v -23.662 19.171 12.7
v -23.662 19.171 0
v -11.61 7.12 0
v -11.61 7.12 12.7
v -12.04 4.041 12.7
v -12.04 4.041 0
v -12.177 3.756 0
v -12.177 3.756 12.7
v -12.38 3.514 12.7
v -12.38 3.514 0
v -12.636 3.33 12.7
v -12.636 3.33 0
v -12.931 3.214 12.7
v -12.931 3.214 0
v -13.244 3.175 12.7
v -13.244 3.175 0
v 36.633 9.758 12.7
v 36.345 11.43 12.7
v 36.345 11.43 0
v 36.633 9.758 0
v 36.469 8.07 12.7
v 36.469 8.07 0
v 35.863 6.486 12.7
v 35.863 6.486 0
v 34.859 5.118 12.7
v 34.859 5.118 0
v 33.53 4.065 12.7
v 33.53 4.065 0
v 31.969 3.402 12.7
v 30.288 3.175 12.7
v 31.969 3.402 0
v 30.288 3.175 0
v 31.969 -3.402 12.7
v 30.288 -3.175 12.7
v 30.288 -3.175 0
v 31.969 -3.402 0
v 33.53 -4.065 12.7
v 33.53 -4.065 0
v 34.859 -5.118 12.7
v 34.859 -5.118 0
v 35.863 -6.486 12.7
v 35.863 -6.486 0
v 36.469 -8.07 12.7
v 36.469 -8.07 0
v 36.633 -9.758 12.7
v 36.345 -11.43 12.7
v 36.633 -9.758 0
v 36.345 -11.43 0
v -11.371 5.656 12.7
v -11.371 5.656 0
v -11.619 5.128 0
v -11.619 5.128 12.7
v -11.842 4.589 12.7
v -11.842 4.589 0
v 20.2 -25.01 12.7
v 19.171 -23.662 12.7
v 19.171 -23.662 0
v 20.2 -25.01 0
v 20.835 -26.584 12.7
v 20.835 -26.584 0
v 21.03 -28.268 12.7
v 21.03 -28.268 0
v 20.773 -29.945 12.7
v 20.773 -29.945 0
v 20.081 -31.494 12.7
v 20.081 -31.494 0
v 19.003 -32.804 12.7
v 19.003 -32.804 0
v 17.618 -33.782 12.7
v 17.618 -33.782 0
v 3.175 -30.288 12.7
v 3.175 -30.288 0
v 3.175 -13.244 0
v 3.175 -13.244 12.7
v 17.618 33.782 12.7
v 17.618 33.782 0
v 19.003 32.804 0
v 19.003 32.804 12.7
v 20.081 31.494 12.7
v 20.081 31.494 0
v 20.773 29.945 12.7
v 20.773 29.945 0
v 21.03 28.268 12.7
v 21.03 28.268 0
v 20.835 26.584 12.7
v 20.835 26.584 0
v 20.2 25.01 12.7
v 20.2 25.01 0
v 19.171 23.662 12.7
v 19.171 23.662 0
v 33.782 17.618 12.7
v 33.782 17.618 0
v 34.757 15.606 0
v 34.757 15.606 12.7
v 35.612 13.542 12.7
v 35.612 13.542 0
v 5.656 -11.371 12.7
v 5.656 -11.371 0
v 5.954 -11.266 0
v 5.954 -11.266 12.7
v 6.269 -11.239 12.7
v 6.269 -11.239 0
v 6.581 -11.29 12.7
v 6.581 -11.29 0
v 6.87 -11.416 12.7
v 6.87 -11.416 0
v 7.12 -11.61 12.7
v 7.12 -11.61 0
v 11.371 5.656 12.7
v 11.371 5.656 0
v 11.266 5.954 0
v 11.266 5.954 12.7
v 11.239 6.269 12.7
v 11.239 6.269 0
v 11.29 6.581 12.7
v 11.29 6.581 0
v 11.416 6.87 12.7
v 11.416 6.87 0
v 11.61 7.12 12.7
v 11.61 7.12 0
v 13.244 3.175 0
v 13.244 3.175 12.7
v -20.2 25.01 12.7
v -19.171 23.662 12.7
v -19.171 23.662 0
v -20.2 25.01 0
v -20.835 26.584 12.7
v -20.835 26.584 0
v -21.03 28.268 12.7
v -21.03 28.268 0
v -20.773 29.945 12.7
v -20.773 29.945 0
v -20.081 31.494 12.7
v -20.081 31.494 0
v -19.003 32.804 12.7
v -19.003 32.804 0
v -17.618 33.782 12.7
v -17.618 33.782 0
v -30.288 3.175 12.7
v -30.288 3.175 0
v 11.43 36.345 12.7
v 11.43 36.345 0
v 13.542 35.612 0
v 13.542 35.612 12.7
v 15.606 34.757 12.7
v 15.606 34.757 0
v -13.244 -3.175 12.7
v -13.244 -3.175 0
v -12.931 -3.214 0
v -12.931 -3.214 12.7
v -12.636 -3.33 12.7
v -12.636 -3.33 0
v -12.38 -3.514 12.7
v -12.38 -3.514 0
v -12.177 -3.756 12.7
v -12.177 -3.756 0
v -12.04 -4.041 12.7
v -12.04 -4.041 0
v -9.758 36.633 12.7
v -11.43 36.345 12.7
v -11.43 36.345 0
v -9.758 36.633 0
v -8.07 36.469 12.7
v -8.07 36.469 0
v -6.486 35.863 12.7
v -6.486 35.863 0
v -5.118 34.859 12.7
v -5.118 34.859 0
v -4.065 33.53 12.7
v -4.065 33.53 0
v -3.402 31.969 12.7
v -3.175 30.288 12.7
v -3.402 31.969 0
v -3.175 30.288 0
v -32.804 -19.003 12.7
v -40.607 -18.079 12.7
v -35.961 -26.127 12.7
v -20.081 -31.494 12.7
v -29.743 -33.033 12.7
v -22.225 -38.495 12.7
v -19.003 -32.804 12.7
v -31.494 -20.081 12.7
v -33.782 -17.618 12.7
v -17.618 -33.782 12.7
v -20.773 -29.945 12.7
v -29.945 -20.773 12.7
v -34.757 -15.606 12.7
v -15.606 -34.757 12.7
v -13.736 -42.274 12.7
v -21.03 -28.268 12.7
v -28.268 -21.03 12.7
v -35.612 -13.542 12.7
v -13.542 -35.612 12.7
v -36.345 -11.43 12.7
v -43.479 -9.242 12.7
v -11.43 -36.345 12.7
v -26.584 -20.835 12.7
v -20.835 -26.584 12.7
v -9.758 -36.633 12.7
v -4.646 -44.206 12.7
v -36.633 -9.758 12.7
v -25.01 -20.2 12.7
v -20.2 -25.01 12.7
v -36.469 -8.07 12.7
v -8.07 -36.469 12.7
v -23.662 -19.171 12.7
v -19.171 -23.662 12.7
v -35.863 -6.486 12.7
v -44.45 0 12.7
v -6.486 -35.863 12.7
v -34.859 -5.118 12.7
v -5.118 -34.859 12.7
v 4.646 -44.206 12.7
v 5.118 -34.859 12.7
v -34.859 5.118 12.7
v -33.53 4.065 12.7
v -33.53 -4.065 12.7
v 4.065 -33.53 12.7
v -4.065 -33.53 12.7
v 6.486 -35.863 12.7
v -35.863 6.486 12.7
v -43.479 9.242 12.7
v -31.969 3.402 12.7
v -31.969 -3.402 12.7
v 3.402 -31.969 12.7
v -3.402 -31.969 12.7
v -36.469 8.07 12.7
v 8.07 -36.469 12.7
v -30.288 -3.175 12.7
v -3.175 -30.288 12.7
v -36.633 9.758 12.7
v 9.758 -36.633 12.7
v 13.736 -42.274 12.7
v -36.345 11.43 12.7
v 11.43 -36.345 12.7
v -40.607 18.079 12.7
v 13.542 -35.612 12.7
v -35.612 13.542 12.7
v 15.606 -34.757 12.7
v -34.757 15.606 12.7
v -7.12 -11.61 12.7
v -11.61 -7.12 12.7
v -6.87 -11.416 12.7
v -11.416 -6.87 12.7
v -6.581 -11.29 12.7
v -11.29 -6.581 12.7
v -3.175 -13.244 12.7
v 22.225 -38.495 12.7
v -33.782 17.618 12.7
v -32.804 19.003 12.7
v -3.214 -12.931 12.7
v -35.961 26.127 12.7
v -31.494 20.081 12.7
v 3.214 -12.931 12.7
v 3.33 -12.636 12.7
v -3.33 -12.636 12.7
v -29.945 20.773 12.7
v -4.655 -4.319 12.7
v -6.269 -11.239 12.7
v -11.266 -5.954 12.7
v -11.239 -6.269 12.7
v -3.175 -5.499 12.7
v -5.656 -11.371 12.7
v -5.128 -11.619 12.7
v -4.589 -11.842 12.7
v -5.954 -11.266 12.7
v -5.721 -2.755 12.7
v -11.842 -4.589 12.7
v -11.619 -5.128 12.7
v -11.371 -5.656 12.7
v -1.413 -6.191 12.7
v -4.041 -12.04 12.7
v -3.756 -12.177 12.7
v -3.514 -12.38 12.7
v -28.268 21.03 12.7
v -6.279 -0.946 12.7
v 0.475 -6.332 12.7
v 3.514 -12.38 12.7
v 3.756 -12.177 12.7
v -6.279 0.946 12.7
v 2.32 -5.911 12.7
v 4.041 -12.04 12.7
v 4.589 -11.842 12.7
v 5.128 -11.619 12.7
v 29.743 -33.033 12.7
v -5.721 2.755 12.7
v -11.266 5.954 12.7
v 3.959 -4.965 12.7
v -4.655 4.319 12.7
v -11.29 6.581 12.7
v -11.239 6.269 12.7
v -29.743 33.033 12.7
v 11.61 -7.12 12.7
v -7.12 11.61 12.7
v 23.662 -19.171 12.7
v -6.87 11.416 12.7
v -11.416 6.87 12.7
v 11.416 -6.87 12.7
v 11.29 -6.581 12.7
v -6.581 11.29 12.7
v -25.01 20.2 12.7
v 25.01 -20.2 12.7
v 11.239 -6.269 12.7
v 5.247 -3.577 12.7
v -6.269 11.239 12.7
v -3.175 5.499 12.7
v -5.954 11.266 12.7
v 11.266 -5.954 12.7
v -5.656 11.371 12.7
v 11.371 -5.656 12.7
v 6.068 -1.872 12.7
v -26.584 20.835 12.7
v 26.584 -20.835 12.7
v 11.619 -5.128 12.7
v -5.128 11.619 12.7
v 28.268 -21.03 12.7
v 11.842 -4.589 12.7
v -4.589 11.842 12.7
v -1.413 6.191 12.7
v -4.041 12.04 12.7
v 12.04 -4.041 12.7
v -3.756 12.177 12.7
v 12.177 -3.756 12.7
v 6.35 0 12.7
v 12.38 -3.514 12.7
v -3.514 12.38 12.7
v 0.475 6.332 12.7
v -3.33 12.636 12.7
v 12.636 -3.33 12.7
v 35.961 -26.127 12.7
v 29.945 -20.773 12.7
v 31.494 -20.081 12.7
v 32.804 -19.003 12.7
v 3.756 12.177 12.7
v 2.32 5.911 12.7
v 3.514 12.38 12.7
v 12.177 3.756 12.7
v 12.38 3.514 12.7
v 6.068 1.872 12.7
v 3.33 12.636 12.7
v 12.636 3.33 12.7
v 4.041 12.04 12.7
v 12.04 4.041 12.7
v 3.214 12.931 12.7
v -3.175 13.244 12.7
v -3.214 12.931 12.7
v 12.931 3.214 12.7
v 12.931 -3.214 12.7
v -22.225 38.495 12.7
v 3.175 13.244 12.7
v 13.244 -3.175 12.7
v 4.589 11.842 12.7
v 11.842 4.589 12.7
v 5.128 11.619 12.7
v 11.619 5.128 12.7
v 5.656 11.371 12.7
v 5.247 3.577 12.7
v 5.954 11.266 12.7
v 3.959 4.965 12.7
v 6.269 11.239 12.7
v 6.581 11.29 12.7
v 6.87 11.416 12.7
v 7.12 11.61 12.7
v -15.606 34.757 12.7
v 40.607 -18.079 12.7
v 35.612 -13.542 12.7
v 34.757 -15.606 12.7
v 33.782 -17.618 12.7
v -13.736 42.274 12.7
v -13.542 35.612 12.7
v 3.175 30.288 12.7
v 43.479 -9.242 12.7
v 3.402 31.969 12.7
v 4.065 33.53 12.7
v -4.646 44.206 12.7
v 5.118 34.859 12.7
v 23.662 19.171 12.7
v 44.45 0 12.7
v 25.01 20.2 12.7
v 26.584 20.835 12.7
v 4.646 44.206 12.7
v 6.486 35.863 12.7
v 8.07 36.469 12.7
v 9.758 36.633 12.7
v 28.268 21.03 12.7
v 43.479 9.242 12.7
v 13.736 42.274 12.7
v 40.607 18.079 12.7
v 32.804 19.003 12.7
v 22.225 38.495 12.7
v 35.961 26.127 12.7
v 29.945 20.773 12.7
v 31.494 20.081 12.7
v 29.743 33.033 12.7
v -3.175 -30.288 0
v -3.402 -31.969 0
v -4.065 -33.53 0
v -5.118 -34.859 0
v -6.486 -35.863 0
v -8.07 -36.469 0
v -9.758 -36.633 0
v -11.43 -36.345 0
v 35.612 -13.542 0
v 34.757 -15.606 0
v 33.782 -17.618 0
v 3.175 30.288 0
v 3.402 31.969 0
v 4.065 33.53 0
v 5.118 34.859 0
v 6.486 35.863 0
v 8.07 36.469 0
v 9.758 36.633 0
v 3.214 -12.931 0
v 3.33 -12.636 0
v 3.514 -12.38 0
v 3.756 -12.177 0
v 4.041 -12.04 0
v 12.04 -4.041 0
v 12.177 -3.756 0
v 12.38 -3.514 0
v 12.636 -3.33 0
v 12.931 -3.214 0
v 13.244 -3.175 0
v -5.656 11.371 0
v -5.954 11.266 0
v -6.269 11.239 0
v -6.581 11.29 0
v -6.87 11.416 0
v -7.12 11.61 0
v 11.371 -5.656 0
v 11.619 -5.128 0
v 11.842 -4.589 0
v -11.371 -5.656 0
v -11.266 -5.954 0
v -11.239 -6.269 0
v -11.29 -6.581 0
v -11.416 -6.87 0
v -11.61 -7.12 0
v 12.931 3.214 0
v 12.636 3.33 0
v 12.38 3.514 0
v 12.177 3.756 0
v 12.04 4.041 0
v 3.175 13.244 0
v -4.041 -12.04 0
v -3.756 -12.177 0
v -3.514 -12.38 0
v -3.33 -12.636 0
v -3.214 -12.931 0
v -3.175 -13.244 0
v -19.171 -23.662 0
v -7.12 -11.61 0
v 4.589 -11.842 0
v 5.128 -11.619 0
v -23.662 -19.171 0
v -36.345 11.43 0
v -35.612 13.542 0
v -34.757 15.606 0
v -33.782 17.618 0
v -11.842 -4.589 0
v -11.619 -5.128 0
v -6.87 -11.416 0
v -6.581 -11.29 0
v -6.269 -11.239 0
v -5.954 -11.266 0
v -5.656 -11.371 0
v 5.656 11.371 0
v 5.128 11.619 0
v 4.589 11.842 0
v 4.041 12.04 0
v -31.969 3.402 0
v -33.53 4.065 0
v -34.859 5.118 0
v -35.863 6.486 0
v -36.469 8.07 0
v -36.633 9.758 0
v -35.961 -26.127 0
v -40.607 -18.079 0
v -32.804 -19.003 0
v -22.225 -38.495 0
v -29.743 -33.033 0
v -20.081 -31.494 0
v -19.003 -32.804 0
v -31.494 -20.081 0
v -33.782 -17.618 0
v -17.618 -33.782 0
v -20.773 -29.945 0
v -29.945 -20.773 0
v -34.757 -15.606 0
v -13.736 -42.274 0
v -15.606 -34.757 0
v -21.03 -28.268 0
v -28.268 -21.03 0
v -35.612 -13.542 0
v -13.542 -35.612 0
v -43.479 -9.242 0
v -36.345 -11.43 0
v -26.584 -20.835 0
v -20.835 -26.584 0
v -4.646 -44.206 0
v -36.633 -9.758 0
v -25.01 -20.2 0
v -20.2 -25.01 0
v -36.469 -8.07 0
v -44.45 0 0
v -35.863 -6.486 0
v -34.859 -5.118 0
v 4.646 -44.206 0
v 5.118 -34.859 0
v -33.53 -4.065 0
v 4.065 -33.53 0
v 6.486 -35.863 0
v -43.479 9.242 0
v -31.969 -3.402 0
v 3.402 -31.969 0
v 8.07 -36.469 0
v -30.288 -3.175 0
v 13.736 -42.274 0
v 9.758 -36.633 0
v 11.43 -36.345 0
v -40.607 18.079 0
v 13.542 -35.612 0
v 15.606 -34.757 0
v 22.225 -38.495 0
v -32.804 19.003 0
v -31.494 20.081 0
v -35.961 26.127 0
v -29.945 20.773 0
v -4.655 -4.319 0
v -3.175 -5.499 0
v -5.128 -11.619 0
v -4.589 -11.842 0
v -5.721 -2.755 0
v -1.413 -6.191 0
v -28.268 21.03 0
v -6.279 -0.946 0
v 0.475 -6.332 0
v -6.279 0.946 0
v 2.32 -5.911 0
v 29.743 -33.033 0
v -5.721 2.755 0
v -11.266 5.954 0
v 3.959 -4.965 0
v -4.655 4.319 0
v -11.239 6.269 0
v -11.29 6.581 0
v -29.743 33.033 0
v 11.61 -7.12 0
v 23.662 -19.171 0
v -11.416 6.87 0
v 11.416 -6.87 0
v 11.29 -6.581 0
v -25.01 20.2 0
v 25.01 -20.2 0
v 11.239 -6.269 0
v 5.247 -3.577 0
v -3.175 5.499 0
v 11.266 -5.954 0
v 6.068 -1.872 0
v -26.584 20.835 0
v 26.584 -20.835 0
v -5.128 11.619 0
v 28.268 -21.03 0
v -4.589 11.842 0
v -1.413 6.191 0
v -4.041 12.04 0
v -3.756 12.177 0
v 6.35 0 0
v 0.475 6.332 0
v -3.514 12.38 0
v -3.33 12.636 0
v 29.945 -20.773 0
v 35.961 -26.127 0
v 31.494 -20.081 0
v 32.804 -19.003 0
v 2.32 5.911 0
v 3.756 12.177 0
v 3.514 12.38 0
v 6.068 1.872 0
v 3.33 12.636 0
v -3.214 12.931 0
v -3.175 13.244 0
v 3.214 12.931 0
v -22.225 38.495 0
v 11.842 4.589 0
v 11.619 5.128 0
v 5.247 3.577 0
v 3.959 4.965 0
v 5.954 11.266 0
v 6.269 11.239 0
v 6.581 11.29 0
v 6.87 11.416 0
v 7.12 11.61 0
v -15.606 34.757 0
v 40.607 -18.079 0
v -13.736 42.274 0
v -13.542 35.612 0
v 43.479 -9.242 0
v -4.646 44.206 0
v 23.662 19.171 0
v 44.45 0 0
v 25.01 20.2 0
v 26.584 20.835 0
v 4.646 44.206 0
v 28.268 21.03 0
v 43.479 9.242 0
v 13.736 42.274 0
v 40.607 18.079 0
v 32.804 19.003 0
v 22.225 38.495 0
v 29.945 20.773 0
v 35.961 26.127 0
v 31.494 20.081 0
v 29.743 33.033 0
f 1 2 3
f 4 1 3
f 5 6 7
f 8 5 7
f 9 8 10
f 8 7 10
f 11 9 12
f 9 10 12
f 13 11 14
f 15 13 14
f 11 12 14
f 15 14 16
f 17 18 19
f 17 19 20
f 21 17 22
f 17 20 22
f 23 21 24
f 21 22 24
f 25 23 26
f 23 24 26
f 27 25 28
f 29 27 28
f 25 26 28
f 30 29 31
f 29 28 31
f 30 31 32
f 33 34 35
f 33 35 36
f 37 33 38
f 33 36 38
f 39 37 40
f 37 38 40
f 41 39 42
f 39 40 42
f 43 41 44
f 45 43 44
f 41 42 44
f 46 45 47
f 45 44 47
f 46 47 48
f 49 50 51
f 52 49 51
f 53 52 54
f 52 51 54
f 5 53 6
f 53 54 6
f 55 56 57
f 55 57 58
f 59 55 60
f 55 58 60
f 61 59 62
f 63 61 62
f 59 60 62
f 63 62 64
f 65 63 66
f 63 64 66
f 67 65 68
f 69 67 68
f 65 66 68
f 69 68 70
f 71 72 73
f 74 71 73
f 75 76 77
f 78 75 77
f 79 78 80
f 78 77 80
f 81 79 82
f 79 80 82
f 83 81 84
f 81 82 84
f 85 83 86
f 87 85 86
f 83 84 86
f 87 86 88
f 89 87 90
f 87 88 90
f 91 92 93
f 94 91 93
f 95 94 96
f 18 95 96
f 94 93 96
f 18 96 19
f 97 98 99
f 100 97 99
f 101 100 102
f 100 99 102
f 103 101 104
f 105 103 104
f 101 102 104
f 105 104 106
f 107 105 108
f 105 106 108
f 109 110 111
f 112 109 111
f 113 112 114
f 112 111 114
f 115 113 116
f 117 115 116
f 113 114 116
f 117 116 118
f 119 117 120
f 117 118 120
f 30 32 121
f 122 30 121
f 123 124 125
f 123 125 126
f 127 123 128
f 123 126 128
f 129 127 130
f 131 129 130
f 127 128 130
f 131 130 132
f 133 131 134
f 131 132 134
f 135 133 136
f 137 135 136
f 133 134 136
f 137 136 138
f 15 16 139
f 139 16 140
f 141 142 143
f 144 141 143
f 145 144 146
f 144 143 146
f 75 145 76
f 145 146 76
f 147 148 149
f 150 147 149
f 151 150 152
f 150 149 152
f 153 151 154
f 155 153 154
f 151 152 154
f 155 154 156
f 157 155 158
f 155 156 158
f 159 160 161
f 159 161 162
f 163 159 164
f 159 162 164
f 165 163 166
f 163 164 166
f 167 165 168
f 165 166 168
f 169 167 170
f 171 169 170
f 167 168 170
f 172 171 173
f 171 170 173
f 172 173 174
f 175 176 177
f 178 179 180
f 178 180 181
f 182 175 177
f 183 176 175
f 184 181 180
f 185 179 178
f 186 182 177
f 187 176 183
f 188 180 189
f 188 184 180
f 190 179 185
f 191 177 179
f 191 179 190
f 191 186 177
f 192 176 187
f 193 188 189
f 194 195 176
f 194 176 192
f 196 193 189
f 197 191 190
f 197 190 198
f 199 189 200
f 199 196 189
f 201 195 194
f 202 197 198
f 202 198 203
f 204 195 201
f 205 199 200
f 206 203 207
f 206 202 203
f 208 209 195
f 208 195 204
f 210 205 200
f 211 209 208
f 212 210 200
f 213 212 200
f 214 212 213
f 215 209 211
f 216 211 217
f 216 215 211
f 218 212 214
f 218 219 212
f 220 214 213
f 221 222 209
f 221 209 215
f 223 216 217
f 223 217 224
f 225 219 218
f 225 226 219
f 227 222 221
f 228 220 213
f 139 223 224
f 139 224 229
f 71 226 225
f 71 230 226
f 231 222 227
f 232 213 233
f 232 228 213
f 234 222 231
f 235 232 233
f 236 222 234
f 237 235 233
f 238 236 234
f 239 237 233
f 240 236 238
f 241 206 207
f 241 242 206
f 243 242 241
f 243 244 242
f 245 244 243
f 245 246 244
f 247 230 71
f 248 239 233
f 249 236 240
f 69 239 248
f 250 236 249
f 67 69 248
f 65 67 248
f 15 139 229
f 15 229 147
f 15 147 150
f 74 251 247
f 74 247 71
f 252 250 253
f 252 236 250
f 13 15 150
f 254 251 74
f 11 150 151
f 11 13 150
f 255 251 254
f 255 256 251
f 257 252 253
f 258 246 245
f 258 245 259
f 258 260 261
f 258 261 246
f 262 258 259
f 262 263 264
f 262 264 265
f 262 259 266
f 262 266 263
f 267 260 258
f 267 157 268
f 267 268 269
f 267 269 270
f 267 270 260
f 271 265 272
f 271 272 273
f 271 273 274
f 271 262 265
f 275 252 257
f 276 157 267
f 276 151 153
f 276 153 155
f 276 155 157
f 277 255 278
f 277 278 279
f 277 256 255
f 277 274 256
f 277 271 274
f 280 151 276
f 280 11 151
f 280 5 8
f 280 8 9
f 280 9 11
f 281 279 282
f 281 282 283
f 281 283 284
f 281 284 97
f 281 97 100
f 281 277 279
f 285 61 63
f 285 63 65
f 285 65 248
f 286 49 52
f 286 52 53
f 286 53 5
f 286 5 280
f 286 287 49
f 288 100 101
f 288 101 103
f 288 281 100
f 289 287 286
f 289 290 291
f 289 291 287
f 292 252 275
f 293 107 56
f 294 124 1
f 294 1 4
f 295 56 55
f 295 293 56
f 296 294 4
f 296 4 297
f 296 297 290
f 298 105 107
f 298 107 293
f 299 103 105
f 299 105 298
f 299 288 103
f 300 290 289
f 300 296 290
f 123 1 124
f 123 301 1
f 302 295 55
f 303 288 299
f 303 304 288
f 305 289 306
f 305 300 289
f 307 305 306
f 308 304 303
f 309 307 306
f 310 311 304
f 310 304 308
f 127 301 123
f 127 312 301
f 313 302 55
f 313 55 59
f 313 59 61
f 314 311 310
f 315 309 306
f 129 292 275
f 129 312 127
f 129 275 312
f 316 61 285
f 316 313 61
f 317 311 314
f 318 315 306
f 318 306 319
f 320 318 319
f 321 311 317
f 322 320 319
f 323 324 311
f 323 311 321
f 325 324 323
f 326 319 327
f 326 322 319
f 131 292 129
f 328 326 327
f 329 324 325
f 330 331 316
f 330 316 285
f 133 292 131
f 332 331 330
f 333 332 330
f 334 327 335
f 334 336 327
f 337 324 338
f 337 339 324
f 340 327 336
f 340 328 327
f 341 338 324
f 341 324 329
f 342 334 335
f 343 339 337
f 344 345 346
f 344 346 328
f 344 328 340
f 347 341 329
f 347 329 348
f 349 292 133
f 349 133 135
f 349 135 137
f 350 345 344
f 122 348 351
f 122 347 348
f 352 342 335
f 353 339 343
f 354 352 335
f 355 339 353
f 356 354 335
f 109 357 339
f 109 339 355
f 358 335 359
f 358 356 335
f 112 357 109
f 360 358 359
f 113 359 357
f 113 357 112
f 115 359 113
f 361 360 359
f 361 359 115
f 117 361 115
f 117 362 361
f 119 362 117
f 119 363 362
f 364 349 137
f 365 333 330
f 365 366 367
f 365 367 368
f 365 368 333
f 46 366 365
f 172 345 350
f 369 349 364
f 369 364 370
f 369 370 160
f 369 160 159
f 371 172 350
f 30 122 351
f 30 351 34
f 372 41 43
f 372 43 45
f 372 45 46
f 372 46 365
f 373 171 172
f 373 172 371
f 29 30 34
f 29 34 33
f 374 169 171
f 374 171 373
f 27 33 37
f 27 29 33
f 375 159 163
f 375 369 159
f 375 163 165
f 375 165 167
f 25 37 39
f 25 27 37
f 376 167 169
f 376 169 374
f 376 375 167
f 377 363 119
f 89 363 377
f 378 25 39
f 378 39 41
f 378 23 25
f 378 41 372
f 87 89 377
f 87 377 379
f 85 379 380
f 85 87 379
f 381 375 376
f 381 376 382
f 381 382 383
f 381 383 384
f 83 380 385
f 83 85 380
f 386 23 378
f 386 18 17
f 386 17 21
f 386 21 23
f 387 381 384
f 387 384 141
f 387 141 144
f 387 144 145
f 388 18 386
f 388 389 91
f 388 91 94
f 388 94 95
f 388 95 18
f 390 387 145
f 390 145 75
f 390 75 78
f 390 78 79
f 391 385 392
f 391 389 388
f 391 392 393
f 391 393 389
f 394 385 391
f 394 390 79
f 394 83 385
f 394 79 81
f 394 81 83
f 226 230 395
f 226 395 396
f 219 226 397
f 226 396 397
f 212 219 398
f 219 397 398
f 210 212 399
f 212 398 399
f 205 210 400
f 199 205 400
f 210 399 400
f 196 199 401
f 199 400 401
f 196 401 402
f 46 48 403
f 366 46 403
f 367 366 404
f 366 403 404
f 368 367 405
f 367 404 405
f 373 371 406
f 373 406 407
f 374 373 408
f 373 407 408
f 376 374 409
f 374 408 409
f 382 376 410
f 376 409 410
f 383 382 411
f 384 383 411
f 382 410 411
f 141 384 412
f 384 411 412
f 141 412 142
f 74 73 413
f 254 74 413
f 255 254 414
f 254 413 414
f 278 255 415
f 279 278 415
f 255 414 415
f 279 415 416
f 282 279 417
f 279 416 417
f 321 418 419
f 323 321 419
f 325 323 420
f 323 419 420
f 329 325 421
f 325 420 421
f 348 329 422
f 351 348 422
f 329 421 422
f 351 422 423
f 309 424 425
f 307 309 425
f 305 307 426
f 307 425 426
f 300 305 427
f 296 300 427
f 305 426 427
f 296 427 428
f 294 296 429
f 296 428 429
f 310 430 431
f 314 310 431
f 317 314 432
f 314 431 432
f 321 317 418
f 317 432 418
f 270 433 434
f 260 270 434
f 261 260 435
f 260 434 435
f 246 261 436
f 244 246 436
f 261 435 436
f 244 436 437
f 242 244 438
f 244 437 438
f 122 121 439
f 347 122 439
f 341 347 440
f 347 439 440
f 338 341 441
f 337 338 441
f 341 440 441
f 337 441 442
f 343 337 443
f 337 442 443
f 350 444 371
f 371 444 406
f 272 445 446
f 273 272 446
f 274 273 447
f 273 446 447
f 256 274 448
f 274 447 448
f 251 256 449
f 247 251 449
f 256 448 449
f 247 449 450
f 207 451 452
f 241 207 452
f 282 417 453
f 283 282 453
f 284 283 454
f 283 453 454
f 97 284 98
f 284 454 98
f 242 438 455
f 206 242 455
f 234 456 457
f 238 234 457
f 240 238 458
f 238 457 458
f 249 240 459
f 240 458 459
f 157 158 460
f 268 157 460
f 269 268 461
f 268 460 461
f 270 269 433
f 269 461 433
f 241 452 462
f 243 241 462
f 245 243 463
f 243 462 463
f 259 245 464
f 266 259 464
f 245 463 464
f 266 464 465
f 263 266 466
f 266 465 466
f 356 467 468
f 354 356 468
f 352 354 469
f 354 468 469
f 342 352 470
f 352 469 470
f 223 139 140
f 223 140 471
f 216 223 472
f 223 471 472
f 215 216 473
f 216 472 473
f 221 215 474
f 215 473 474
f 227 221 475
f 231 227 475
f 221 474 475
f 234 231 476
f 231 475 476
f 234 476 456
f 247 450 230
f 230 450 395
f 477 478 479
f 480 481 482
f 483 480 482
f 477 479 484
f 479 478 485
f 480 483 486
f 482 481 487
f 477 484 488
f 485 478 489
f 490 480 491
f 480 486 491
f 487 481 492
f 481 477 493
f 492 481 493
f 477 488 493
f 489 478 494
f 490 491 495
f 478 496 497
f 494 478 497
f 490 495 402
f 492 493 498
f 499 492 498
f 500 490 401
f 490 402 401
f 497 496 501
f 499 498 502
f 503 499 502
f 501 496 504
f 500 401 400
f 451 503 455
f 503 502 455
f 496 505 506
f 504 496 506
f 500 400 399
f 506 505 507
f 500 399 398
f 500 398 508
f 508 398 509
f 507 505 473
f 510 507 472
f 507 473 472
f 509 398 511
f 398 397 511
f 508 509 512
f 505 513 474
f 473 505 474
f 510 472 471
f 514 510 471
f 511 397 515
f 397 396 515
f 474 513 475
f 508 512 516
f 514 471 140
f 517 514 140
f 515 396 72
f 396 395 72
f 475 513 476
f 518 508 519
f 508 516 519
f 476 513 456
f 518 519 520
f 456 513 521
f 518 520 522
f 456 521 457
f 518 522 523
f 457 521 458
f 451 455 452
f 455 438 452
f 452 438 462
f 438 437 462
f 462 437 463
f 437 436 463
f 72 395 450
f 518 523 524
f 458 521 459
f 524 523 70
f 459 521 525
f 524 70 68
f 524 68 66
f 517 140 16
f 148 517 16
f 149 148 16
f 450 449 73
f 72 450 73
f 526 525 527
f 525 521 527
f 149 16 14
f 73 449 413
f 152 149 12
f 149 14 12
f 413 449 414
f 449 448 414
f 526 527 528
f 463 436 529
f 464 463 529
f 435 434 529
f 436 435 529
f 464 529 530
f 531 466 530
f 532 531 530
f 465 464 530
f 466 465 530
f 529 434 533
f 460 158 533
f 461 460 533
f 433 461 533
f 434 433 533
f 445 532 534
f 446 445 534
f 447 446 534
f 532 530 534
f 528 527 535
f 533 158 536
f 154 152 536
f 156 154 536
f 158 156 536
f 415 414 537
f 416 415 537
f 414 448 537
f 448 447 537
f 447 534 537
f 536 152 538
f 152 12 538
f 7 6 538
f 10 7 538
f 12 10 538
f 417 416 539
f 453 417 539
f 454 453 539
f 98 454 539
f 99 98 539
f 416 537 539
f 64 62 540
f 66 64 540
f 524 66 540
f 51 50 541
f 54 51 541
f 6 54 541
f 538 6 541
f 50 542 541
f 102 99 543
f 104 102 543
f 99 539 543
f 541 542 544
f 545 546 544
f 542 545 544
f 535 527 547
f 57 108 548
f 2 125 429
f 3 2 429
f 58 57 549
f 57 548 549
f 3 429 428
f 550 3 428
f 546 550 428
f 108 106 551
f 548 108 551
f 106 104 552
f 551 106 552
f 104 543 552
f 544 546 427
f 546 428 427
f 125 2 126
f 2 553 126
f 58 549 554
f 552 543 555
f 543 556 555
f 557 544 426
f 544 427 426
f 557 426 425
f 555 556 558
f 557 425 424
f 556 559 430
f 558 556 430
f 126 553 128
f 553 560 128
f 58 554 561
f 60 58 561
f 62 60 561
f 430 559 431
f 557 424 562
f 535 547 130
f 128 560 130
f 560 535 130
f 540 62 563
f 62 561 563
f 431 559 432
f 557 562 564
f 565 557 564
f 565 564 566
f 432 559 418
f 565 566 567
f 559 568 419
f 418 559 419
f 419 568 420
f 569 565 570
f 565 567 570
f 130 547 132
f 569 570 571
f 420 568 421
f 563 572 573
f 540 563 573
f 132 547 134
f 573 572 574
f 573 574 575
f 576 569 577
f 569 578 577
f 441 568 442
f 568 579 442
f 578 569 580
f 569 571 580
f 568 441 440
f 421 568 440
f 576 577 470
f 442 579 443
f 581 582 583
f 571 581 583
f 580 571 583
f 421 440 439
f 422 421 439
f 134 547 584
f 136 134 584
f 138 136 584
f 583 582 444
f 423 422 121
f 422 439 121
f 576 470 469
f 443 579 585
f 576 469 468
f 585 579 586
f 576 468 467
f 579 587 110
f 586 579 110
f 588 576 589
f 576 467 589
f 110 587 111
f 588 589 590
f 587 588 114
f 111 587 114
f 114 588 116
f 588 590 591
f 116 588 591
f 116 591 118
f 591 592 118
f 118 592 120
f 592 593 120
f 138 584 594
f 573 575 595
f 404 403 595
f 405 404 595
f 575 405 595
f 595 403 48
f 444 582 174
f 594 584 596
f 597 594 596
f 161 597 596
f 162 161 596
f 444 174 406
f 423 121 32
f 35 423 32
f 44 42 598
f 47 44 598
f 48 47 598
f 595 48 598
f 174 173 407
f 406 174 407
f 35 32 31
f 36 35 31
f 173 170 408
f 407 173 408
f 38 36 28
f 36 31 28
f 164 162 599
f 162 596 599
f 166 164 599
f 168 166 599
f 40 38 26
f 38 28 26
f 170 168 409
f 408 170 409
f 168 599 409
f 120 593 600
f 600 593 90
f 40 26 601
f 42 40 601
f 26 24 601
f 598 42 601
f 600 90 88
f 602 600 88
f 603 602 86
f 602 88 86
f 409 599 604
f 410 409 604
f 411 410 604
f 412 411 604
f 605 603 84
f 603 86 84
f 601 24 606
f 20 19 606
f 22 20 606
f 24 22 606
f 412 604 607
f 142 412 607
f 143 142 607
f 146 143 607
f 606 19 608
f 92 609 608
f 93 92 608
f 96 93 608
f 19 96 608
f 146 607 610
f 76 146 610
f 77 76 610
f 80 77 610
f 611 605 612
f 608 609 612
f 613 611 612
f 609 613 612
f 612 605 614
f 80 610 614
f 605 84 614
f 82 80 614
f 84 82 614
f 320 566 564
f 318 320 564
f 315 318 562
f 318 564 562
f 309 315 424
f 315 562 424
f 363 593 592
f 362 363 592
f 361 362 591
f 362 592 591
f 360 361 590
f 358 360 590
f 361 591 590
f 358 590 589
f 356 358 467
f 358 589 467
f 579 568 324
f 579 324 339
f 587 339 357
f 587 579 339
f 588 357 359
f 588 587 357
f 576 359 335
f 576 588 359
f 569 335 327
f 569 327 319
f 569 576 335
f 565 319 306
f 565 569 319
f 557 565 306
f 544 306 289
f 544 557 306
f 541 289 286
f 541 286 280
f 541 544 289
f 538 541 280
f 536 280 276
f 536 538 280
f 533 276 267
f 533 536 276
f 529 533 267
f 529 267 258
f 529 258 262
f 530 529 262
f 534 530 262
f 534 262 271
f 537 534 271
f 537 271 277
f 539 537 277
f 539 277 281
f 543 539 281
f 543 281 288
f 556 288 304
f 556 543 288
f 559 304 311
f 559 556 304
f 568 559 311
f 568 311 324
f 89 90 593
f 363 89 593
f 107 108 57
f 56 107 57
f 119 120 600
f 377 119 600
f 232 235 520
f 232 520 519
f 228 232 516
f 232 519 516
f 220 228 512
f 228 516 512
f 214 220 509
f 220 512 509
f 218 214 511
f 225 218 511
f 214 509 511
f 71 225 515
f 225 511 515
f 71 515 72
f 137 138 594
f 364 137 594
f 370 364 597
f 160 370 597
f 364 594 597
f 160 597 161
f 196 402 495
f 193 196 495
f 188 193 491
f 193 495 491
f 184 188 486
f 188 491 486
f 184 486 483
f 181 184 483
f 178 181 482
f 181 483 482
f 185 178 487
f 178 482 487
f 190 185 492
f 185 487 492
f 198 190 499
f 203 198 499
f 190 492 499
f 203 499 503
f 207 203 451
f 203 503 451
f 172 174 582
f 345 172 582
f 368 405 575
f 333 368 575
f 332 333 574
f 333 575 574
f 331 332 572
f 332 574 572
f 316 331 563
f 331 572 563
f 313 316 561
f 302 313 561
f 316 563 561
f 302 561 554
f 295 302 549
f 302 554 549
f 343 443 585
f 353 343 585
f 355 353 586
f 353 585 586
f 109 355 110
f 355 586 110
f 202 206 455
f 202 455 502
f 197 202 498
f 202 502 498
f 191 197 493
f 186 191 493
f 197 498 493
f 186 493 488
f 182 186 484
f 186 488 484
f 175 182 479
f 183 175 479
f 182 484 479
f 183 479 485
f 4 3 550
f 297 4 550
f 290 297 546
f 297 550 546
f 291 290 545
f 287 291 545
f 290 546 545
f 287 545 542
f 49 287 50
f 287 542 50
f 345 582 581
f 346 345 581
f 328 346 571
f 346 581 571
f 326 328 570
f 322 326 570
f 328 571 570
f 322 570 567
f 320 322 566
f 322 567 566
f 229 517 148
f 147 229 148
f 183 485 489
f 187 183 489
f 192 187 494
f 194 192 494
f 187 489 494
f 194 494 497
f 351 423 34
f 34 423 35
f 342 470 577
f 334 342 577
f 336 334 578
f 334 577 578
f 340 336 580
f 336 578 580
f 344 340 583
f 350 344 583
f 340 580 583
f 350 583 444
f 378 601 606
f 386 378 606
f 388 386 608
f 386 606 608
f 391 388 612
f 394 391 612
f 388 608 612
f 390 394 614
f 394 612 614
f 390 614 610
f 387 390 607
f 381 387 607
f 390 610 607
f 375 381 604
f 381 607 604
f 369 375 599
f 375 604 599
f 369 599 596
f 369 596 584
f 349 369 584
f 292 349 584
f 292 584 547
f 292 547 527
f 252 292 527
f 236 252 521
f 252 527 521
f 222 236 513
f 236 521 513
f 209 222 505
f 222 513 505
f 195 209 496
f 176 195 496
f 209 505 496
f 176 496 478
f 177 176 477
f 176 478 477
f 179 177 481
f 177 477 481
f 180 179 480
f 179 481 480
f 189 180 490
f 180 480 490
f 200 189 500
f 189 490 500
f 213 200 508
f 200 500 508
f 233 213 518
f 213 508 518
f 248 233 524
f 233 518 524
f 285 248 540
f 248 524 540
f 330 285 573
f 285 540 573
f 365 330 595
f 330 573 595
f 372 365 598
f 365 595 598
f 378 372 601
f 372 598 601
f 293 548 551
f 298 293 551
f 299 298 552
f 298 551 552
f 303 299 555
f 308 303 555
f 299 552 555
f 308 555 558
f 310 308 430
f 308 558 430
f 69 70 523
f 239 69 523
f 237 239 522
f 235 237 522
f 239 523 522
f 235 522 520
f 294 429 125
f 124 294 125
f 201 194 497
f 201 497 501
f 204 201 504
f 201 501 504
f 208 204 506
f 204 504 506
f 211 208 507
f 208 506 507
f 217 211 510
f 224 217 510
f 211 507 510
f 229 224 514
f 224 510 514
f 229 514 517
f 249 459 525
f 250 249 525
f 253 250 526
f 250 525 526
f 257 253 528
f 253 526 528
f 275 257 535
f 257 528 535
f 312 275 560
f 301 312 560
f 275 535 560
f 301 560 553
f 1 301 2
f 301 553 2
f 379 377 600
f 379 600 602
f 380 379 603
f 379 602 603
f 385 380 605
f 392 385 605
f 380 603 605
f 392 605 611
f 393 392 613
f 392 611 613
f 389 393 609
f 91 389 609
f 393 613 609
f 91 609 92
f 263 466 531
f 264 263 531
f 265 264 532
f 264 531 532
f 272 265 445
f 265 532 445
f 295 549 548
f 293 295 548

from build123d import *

# Parameters (mm, degrees)
F0_R     = 44.45
F0_R_2   = 6.35
F1_DEPTH = 12.7


with BuildPart() as f1:
    # F0 (on Top) → F1 (new body)
    with BuildSketch(Plane.XY):
        Circle(F0_R)
        with BuildLine():
            ThreePointArc((-4.040909, -12.039977), (-3.413958, -12.502455), (-3.175, -13.243975))
            Line((-3.175, -13.243975), (-3.175, -30.28757))
            ThreePointArc((-3.175, -30.28757), (-5.768289, -35.407103), (-11.43, -36.345084))
            ThreePointArc((-11.43, -36.345084), (-14.580239, -35.19981), (-17.617625, -33.782086))
            ThreePointArc((-17.617625, -33.782086), (-20.957806, -29.115399), (-19.171482, -23.66161))
            Line((-19.171482, -23.66161), (-7.119841, -11.609969))
            ThreePointArc((-7.119841, -11.609969), (-6.426538, -11.254603), (-5.656195, -11.370904))
            ThreePointArc((-5.656195, -11.370904), (-4.86008, -11.73327), (-4.040909, -12.039977))
        make_face(mode=Mode.SUBTRACT)
        with BuildLine():
            Line((-30.28757, -3.175), (-13.243975, -3.175))
            ThreePointArc((-13.243975, -3.175), (-12.502455, -3.413958), (-12.039977, -4.040909))
            ThreePointArc((-12.039977, -4.040909), (-11.73327, -4.86008), (-11.370904, -5.656195))
            ThreePointArc((-11.370904, -5.656195), (-11.254603, -6.426538), (-11.609969, -7.119841))
            Line((-11.609969, -7.119841), (-23.66161, -19.171482))
            ThreePointArc((-23.66161, -19.171482), (-29.115399, -20.957806), (-33.782086, -17.617625))
            ThreePointArc((-33.782086, -17.617625), (-35.19981, -14.580239), (-36.345084, -11.43))
            ThreePointArc((-36.345084, -11.43), (-35.407103, -5.768289), (-30.28757, -3.175))
        make_face(mode=Mode.SUBTRACT)
        with BuildLine():
            Line((3.175, -30.28757), (3.175, -13.243975))
            ThreePointArc((3.175, -13.243975), (3.413958, -12.502455), (4.040909, -12.039977))
            ThreePointArc((4.040909, -12.039977), (4.86008, -11.73327), (5.656195, -11.370904))
            ThreePointArc((5.656195, -11.370904), (6.426538, -11.254603), (7.119841, -11.609969))
            Line((7.119841, -11.609969), (19.171482, -23.66161))
            ThreePointArc((19.171482, -23.66161), (20.957806, -29.115399), (17.617625, -33.782086))
            ThreePointArc((17.617625, -33.782086), (14.580239, -35.19981), (11.43, -36.345084))
            ThreePointArc((11.43, -36.345084), (5.768289, -35.407103), (3.175, -30.28757))
        make_face(mode=Mode.SUBTRACT)
        with BuildLine():
            ThreePointArc((12.039977, -4.040909), (12.502455, -3.413958), (13.243975, -3.175))
            Line((13.243975, -3.175), (30.28757, -3.175))
            ThreePointArc((30.28757, -3.175), (35.407103, -5.768289), (36.345084, -11.43))
            ThreePointArc((36.345084, -11.43), (35.19981, -14.580239), (33.782086, -17.617625))
            ThreePointArc((33.782086, -17.617625), (29.115399, -20.957806), (23.66161, -19.171482))
            Line((23.66161, -19.171482), (11.609969, -7.119841))
            ThreePointArc((11.609969, -7.119841), (11.254603, -6.426538), (11.370904, -5.656195))
            ThreePointArc((11.370904, -5.656195), (11.73327, -4.86008), (12.039977, -4.040909))
        make_face(mode=Mode.SUBTRACT)
        with BuildLine():
            ThreePointArc((-12.039977, 4.040909), (-12.502455, 3.413958), (-13.243975, 3.175))
            Line((-13.243975, 3.175), (-30.28757, 3.175))
            ThreePointArc((-30.28757, 3.175), (-35.407103, 5.768289), (-36.345084, 11.43))
            ThreePointArc((-36.345084, 11.43), (-35.19981, 14.580239), (-33.782086, 17.617625))
            ThreePointArc((-33.782086, 17.617625), (-29.115399, 20.957806), (-23.66161, 19.171482))
            Line((-23.66161, 19.171482), (-11.609969, 7.119841))
            ThreePointArc((-11.609969, 7.119841), (-11.254603, 6.426538), (-11.370904, 5.656195))
            ThreePointArc((-11.370904, 5.656195), (-11.73327, 4.86008), (-12.039977, 4.040909))
        make_face(mode=Mode.SUBTRACT)
        with BuildLine():
            ThreePointArc((-17.617625, 33.782086), (-14.580239, 35.19981), (-11.43, 36.345084))
            ThreePointArc((-11.43, 36.345084), (-5.768289, 35.407103), (-3.175, 30.28757))
            Line((-3.175, 30.28757), (-3.175, 13.243975))
            ThreePointArc((-3.175, 13.243975), (-3.413958, 12.502455), (-4.040909, 12.039977))
            ThreePointArc((-4.040909, 12.039977), (-4.86008, 11.73327), (-5.656195, 11.370904))
            ThreePointArc((-5.656195, 11.370904), (-6.426538, 11.254603), (-7.119841, 11.609969))
            Line((-7.119841, 11.609969), (-19.171482, 23.66161))
            ThreePointArc((-19.171482, 23.66161), (-20.957806, 29.115399), (-17.617625, 33.782086))
        make_face(mode=Mode.SUBTRACT)
        Circle(F0_R_2, mode=Mode.SUBTRACT)
        with BuildLine():
            ThreePointArc((13.243975, 3.175), (12.502455, 3.413958), (12.039977, 4.040909))
            ThreePointArc((12.039977, 4.040909), (11.73327, 4.86008), (11.370904, 5.656195))
            ThreePointArc((11.370904, 5.656195), (11.254603, 6.426538), (11.609969, 7.119841))
            Line((11.609969, 7.119841), (23.66161, 19.171482))
            ThreePointArc((23.66161, 19.171482), (29.115399, 20.957806), (33.782086, 17.617625))
            ThreePointArc((33.782086, 17.617625), (35.19981, 14.580239), (36.345084, 11.43))
            ThreePointArc((36.345084, 11.43), (35.407103, 5.768289), (30.28757, 3.175))
            Line((30.28757, 3.175), (13.243975, 3.175))
        make_face(mode=Mode.SUBTRACT)
        with BuildLine():
            Line((3.175, 13.243975), (3.175, 30.28757))
            ThreePointArc((3.175, 30.28757), (5.768289, 35.407103), (11.43, 36.345084))
            ThreePointArc((11.43, 36.345084), (14.580239, 35.19981), (17.617625, 33.782086))
            ThreePointArc((17.617625, 33.782086), (20.957806, 29.115399), (19.171482, 23.66161))
            Line((19.171482, 23.66161), (7.119841, 11.609969))
            ThreePointArc((7.119841, 11.609969), (6.426538, 11.254603), (5.656195, 11.370904))
            ThreePointArc((5.656195, 11.370904), (4.86008, 11.73327), (4.040909, 12.039977))
            ThreePointArc((4.040909, 12.039977), (3.413958, 12.502455), (3.175, 13.243975))
        make_face(mode=Mode.SUBTRACT)
    extrude(amount=F1_DEPTH)


solid = f1.part
